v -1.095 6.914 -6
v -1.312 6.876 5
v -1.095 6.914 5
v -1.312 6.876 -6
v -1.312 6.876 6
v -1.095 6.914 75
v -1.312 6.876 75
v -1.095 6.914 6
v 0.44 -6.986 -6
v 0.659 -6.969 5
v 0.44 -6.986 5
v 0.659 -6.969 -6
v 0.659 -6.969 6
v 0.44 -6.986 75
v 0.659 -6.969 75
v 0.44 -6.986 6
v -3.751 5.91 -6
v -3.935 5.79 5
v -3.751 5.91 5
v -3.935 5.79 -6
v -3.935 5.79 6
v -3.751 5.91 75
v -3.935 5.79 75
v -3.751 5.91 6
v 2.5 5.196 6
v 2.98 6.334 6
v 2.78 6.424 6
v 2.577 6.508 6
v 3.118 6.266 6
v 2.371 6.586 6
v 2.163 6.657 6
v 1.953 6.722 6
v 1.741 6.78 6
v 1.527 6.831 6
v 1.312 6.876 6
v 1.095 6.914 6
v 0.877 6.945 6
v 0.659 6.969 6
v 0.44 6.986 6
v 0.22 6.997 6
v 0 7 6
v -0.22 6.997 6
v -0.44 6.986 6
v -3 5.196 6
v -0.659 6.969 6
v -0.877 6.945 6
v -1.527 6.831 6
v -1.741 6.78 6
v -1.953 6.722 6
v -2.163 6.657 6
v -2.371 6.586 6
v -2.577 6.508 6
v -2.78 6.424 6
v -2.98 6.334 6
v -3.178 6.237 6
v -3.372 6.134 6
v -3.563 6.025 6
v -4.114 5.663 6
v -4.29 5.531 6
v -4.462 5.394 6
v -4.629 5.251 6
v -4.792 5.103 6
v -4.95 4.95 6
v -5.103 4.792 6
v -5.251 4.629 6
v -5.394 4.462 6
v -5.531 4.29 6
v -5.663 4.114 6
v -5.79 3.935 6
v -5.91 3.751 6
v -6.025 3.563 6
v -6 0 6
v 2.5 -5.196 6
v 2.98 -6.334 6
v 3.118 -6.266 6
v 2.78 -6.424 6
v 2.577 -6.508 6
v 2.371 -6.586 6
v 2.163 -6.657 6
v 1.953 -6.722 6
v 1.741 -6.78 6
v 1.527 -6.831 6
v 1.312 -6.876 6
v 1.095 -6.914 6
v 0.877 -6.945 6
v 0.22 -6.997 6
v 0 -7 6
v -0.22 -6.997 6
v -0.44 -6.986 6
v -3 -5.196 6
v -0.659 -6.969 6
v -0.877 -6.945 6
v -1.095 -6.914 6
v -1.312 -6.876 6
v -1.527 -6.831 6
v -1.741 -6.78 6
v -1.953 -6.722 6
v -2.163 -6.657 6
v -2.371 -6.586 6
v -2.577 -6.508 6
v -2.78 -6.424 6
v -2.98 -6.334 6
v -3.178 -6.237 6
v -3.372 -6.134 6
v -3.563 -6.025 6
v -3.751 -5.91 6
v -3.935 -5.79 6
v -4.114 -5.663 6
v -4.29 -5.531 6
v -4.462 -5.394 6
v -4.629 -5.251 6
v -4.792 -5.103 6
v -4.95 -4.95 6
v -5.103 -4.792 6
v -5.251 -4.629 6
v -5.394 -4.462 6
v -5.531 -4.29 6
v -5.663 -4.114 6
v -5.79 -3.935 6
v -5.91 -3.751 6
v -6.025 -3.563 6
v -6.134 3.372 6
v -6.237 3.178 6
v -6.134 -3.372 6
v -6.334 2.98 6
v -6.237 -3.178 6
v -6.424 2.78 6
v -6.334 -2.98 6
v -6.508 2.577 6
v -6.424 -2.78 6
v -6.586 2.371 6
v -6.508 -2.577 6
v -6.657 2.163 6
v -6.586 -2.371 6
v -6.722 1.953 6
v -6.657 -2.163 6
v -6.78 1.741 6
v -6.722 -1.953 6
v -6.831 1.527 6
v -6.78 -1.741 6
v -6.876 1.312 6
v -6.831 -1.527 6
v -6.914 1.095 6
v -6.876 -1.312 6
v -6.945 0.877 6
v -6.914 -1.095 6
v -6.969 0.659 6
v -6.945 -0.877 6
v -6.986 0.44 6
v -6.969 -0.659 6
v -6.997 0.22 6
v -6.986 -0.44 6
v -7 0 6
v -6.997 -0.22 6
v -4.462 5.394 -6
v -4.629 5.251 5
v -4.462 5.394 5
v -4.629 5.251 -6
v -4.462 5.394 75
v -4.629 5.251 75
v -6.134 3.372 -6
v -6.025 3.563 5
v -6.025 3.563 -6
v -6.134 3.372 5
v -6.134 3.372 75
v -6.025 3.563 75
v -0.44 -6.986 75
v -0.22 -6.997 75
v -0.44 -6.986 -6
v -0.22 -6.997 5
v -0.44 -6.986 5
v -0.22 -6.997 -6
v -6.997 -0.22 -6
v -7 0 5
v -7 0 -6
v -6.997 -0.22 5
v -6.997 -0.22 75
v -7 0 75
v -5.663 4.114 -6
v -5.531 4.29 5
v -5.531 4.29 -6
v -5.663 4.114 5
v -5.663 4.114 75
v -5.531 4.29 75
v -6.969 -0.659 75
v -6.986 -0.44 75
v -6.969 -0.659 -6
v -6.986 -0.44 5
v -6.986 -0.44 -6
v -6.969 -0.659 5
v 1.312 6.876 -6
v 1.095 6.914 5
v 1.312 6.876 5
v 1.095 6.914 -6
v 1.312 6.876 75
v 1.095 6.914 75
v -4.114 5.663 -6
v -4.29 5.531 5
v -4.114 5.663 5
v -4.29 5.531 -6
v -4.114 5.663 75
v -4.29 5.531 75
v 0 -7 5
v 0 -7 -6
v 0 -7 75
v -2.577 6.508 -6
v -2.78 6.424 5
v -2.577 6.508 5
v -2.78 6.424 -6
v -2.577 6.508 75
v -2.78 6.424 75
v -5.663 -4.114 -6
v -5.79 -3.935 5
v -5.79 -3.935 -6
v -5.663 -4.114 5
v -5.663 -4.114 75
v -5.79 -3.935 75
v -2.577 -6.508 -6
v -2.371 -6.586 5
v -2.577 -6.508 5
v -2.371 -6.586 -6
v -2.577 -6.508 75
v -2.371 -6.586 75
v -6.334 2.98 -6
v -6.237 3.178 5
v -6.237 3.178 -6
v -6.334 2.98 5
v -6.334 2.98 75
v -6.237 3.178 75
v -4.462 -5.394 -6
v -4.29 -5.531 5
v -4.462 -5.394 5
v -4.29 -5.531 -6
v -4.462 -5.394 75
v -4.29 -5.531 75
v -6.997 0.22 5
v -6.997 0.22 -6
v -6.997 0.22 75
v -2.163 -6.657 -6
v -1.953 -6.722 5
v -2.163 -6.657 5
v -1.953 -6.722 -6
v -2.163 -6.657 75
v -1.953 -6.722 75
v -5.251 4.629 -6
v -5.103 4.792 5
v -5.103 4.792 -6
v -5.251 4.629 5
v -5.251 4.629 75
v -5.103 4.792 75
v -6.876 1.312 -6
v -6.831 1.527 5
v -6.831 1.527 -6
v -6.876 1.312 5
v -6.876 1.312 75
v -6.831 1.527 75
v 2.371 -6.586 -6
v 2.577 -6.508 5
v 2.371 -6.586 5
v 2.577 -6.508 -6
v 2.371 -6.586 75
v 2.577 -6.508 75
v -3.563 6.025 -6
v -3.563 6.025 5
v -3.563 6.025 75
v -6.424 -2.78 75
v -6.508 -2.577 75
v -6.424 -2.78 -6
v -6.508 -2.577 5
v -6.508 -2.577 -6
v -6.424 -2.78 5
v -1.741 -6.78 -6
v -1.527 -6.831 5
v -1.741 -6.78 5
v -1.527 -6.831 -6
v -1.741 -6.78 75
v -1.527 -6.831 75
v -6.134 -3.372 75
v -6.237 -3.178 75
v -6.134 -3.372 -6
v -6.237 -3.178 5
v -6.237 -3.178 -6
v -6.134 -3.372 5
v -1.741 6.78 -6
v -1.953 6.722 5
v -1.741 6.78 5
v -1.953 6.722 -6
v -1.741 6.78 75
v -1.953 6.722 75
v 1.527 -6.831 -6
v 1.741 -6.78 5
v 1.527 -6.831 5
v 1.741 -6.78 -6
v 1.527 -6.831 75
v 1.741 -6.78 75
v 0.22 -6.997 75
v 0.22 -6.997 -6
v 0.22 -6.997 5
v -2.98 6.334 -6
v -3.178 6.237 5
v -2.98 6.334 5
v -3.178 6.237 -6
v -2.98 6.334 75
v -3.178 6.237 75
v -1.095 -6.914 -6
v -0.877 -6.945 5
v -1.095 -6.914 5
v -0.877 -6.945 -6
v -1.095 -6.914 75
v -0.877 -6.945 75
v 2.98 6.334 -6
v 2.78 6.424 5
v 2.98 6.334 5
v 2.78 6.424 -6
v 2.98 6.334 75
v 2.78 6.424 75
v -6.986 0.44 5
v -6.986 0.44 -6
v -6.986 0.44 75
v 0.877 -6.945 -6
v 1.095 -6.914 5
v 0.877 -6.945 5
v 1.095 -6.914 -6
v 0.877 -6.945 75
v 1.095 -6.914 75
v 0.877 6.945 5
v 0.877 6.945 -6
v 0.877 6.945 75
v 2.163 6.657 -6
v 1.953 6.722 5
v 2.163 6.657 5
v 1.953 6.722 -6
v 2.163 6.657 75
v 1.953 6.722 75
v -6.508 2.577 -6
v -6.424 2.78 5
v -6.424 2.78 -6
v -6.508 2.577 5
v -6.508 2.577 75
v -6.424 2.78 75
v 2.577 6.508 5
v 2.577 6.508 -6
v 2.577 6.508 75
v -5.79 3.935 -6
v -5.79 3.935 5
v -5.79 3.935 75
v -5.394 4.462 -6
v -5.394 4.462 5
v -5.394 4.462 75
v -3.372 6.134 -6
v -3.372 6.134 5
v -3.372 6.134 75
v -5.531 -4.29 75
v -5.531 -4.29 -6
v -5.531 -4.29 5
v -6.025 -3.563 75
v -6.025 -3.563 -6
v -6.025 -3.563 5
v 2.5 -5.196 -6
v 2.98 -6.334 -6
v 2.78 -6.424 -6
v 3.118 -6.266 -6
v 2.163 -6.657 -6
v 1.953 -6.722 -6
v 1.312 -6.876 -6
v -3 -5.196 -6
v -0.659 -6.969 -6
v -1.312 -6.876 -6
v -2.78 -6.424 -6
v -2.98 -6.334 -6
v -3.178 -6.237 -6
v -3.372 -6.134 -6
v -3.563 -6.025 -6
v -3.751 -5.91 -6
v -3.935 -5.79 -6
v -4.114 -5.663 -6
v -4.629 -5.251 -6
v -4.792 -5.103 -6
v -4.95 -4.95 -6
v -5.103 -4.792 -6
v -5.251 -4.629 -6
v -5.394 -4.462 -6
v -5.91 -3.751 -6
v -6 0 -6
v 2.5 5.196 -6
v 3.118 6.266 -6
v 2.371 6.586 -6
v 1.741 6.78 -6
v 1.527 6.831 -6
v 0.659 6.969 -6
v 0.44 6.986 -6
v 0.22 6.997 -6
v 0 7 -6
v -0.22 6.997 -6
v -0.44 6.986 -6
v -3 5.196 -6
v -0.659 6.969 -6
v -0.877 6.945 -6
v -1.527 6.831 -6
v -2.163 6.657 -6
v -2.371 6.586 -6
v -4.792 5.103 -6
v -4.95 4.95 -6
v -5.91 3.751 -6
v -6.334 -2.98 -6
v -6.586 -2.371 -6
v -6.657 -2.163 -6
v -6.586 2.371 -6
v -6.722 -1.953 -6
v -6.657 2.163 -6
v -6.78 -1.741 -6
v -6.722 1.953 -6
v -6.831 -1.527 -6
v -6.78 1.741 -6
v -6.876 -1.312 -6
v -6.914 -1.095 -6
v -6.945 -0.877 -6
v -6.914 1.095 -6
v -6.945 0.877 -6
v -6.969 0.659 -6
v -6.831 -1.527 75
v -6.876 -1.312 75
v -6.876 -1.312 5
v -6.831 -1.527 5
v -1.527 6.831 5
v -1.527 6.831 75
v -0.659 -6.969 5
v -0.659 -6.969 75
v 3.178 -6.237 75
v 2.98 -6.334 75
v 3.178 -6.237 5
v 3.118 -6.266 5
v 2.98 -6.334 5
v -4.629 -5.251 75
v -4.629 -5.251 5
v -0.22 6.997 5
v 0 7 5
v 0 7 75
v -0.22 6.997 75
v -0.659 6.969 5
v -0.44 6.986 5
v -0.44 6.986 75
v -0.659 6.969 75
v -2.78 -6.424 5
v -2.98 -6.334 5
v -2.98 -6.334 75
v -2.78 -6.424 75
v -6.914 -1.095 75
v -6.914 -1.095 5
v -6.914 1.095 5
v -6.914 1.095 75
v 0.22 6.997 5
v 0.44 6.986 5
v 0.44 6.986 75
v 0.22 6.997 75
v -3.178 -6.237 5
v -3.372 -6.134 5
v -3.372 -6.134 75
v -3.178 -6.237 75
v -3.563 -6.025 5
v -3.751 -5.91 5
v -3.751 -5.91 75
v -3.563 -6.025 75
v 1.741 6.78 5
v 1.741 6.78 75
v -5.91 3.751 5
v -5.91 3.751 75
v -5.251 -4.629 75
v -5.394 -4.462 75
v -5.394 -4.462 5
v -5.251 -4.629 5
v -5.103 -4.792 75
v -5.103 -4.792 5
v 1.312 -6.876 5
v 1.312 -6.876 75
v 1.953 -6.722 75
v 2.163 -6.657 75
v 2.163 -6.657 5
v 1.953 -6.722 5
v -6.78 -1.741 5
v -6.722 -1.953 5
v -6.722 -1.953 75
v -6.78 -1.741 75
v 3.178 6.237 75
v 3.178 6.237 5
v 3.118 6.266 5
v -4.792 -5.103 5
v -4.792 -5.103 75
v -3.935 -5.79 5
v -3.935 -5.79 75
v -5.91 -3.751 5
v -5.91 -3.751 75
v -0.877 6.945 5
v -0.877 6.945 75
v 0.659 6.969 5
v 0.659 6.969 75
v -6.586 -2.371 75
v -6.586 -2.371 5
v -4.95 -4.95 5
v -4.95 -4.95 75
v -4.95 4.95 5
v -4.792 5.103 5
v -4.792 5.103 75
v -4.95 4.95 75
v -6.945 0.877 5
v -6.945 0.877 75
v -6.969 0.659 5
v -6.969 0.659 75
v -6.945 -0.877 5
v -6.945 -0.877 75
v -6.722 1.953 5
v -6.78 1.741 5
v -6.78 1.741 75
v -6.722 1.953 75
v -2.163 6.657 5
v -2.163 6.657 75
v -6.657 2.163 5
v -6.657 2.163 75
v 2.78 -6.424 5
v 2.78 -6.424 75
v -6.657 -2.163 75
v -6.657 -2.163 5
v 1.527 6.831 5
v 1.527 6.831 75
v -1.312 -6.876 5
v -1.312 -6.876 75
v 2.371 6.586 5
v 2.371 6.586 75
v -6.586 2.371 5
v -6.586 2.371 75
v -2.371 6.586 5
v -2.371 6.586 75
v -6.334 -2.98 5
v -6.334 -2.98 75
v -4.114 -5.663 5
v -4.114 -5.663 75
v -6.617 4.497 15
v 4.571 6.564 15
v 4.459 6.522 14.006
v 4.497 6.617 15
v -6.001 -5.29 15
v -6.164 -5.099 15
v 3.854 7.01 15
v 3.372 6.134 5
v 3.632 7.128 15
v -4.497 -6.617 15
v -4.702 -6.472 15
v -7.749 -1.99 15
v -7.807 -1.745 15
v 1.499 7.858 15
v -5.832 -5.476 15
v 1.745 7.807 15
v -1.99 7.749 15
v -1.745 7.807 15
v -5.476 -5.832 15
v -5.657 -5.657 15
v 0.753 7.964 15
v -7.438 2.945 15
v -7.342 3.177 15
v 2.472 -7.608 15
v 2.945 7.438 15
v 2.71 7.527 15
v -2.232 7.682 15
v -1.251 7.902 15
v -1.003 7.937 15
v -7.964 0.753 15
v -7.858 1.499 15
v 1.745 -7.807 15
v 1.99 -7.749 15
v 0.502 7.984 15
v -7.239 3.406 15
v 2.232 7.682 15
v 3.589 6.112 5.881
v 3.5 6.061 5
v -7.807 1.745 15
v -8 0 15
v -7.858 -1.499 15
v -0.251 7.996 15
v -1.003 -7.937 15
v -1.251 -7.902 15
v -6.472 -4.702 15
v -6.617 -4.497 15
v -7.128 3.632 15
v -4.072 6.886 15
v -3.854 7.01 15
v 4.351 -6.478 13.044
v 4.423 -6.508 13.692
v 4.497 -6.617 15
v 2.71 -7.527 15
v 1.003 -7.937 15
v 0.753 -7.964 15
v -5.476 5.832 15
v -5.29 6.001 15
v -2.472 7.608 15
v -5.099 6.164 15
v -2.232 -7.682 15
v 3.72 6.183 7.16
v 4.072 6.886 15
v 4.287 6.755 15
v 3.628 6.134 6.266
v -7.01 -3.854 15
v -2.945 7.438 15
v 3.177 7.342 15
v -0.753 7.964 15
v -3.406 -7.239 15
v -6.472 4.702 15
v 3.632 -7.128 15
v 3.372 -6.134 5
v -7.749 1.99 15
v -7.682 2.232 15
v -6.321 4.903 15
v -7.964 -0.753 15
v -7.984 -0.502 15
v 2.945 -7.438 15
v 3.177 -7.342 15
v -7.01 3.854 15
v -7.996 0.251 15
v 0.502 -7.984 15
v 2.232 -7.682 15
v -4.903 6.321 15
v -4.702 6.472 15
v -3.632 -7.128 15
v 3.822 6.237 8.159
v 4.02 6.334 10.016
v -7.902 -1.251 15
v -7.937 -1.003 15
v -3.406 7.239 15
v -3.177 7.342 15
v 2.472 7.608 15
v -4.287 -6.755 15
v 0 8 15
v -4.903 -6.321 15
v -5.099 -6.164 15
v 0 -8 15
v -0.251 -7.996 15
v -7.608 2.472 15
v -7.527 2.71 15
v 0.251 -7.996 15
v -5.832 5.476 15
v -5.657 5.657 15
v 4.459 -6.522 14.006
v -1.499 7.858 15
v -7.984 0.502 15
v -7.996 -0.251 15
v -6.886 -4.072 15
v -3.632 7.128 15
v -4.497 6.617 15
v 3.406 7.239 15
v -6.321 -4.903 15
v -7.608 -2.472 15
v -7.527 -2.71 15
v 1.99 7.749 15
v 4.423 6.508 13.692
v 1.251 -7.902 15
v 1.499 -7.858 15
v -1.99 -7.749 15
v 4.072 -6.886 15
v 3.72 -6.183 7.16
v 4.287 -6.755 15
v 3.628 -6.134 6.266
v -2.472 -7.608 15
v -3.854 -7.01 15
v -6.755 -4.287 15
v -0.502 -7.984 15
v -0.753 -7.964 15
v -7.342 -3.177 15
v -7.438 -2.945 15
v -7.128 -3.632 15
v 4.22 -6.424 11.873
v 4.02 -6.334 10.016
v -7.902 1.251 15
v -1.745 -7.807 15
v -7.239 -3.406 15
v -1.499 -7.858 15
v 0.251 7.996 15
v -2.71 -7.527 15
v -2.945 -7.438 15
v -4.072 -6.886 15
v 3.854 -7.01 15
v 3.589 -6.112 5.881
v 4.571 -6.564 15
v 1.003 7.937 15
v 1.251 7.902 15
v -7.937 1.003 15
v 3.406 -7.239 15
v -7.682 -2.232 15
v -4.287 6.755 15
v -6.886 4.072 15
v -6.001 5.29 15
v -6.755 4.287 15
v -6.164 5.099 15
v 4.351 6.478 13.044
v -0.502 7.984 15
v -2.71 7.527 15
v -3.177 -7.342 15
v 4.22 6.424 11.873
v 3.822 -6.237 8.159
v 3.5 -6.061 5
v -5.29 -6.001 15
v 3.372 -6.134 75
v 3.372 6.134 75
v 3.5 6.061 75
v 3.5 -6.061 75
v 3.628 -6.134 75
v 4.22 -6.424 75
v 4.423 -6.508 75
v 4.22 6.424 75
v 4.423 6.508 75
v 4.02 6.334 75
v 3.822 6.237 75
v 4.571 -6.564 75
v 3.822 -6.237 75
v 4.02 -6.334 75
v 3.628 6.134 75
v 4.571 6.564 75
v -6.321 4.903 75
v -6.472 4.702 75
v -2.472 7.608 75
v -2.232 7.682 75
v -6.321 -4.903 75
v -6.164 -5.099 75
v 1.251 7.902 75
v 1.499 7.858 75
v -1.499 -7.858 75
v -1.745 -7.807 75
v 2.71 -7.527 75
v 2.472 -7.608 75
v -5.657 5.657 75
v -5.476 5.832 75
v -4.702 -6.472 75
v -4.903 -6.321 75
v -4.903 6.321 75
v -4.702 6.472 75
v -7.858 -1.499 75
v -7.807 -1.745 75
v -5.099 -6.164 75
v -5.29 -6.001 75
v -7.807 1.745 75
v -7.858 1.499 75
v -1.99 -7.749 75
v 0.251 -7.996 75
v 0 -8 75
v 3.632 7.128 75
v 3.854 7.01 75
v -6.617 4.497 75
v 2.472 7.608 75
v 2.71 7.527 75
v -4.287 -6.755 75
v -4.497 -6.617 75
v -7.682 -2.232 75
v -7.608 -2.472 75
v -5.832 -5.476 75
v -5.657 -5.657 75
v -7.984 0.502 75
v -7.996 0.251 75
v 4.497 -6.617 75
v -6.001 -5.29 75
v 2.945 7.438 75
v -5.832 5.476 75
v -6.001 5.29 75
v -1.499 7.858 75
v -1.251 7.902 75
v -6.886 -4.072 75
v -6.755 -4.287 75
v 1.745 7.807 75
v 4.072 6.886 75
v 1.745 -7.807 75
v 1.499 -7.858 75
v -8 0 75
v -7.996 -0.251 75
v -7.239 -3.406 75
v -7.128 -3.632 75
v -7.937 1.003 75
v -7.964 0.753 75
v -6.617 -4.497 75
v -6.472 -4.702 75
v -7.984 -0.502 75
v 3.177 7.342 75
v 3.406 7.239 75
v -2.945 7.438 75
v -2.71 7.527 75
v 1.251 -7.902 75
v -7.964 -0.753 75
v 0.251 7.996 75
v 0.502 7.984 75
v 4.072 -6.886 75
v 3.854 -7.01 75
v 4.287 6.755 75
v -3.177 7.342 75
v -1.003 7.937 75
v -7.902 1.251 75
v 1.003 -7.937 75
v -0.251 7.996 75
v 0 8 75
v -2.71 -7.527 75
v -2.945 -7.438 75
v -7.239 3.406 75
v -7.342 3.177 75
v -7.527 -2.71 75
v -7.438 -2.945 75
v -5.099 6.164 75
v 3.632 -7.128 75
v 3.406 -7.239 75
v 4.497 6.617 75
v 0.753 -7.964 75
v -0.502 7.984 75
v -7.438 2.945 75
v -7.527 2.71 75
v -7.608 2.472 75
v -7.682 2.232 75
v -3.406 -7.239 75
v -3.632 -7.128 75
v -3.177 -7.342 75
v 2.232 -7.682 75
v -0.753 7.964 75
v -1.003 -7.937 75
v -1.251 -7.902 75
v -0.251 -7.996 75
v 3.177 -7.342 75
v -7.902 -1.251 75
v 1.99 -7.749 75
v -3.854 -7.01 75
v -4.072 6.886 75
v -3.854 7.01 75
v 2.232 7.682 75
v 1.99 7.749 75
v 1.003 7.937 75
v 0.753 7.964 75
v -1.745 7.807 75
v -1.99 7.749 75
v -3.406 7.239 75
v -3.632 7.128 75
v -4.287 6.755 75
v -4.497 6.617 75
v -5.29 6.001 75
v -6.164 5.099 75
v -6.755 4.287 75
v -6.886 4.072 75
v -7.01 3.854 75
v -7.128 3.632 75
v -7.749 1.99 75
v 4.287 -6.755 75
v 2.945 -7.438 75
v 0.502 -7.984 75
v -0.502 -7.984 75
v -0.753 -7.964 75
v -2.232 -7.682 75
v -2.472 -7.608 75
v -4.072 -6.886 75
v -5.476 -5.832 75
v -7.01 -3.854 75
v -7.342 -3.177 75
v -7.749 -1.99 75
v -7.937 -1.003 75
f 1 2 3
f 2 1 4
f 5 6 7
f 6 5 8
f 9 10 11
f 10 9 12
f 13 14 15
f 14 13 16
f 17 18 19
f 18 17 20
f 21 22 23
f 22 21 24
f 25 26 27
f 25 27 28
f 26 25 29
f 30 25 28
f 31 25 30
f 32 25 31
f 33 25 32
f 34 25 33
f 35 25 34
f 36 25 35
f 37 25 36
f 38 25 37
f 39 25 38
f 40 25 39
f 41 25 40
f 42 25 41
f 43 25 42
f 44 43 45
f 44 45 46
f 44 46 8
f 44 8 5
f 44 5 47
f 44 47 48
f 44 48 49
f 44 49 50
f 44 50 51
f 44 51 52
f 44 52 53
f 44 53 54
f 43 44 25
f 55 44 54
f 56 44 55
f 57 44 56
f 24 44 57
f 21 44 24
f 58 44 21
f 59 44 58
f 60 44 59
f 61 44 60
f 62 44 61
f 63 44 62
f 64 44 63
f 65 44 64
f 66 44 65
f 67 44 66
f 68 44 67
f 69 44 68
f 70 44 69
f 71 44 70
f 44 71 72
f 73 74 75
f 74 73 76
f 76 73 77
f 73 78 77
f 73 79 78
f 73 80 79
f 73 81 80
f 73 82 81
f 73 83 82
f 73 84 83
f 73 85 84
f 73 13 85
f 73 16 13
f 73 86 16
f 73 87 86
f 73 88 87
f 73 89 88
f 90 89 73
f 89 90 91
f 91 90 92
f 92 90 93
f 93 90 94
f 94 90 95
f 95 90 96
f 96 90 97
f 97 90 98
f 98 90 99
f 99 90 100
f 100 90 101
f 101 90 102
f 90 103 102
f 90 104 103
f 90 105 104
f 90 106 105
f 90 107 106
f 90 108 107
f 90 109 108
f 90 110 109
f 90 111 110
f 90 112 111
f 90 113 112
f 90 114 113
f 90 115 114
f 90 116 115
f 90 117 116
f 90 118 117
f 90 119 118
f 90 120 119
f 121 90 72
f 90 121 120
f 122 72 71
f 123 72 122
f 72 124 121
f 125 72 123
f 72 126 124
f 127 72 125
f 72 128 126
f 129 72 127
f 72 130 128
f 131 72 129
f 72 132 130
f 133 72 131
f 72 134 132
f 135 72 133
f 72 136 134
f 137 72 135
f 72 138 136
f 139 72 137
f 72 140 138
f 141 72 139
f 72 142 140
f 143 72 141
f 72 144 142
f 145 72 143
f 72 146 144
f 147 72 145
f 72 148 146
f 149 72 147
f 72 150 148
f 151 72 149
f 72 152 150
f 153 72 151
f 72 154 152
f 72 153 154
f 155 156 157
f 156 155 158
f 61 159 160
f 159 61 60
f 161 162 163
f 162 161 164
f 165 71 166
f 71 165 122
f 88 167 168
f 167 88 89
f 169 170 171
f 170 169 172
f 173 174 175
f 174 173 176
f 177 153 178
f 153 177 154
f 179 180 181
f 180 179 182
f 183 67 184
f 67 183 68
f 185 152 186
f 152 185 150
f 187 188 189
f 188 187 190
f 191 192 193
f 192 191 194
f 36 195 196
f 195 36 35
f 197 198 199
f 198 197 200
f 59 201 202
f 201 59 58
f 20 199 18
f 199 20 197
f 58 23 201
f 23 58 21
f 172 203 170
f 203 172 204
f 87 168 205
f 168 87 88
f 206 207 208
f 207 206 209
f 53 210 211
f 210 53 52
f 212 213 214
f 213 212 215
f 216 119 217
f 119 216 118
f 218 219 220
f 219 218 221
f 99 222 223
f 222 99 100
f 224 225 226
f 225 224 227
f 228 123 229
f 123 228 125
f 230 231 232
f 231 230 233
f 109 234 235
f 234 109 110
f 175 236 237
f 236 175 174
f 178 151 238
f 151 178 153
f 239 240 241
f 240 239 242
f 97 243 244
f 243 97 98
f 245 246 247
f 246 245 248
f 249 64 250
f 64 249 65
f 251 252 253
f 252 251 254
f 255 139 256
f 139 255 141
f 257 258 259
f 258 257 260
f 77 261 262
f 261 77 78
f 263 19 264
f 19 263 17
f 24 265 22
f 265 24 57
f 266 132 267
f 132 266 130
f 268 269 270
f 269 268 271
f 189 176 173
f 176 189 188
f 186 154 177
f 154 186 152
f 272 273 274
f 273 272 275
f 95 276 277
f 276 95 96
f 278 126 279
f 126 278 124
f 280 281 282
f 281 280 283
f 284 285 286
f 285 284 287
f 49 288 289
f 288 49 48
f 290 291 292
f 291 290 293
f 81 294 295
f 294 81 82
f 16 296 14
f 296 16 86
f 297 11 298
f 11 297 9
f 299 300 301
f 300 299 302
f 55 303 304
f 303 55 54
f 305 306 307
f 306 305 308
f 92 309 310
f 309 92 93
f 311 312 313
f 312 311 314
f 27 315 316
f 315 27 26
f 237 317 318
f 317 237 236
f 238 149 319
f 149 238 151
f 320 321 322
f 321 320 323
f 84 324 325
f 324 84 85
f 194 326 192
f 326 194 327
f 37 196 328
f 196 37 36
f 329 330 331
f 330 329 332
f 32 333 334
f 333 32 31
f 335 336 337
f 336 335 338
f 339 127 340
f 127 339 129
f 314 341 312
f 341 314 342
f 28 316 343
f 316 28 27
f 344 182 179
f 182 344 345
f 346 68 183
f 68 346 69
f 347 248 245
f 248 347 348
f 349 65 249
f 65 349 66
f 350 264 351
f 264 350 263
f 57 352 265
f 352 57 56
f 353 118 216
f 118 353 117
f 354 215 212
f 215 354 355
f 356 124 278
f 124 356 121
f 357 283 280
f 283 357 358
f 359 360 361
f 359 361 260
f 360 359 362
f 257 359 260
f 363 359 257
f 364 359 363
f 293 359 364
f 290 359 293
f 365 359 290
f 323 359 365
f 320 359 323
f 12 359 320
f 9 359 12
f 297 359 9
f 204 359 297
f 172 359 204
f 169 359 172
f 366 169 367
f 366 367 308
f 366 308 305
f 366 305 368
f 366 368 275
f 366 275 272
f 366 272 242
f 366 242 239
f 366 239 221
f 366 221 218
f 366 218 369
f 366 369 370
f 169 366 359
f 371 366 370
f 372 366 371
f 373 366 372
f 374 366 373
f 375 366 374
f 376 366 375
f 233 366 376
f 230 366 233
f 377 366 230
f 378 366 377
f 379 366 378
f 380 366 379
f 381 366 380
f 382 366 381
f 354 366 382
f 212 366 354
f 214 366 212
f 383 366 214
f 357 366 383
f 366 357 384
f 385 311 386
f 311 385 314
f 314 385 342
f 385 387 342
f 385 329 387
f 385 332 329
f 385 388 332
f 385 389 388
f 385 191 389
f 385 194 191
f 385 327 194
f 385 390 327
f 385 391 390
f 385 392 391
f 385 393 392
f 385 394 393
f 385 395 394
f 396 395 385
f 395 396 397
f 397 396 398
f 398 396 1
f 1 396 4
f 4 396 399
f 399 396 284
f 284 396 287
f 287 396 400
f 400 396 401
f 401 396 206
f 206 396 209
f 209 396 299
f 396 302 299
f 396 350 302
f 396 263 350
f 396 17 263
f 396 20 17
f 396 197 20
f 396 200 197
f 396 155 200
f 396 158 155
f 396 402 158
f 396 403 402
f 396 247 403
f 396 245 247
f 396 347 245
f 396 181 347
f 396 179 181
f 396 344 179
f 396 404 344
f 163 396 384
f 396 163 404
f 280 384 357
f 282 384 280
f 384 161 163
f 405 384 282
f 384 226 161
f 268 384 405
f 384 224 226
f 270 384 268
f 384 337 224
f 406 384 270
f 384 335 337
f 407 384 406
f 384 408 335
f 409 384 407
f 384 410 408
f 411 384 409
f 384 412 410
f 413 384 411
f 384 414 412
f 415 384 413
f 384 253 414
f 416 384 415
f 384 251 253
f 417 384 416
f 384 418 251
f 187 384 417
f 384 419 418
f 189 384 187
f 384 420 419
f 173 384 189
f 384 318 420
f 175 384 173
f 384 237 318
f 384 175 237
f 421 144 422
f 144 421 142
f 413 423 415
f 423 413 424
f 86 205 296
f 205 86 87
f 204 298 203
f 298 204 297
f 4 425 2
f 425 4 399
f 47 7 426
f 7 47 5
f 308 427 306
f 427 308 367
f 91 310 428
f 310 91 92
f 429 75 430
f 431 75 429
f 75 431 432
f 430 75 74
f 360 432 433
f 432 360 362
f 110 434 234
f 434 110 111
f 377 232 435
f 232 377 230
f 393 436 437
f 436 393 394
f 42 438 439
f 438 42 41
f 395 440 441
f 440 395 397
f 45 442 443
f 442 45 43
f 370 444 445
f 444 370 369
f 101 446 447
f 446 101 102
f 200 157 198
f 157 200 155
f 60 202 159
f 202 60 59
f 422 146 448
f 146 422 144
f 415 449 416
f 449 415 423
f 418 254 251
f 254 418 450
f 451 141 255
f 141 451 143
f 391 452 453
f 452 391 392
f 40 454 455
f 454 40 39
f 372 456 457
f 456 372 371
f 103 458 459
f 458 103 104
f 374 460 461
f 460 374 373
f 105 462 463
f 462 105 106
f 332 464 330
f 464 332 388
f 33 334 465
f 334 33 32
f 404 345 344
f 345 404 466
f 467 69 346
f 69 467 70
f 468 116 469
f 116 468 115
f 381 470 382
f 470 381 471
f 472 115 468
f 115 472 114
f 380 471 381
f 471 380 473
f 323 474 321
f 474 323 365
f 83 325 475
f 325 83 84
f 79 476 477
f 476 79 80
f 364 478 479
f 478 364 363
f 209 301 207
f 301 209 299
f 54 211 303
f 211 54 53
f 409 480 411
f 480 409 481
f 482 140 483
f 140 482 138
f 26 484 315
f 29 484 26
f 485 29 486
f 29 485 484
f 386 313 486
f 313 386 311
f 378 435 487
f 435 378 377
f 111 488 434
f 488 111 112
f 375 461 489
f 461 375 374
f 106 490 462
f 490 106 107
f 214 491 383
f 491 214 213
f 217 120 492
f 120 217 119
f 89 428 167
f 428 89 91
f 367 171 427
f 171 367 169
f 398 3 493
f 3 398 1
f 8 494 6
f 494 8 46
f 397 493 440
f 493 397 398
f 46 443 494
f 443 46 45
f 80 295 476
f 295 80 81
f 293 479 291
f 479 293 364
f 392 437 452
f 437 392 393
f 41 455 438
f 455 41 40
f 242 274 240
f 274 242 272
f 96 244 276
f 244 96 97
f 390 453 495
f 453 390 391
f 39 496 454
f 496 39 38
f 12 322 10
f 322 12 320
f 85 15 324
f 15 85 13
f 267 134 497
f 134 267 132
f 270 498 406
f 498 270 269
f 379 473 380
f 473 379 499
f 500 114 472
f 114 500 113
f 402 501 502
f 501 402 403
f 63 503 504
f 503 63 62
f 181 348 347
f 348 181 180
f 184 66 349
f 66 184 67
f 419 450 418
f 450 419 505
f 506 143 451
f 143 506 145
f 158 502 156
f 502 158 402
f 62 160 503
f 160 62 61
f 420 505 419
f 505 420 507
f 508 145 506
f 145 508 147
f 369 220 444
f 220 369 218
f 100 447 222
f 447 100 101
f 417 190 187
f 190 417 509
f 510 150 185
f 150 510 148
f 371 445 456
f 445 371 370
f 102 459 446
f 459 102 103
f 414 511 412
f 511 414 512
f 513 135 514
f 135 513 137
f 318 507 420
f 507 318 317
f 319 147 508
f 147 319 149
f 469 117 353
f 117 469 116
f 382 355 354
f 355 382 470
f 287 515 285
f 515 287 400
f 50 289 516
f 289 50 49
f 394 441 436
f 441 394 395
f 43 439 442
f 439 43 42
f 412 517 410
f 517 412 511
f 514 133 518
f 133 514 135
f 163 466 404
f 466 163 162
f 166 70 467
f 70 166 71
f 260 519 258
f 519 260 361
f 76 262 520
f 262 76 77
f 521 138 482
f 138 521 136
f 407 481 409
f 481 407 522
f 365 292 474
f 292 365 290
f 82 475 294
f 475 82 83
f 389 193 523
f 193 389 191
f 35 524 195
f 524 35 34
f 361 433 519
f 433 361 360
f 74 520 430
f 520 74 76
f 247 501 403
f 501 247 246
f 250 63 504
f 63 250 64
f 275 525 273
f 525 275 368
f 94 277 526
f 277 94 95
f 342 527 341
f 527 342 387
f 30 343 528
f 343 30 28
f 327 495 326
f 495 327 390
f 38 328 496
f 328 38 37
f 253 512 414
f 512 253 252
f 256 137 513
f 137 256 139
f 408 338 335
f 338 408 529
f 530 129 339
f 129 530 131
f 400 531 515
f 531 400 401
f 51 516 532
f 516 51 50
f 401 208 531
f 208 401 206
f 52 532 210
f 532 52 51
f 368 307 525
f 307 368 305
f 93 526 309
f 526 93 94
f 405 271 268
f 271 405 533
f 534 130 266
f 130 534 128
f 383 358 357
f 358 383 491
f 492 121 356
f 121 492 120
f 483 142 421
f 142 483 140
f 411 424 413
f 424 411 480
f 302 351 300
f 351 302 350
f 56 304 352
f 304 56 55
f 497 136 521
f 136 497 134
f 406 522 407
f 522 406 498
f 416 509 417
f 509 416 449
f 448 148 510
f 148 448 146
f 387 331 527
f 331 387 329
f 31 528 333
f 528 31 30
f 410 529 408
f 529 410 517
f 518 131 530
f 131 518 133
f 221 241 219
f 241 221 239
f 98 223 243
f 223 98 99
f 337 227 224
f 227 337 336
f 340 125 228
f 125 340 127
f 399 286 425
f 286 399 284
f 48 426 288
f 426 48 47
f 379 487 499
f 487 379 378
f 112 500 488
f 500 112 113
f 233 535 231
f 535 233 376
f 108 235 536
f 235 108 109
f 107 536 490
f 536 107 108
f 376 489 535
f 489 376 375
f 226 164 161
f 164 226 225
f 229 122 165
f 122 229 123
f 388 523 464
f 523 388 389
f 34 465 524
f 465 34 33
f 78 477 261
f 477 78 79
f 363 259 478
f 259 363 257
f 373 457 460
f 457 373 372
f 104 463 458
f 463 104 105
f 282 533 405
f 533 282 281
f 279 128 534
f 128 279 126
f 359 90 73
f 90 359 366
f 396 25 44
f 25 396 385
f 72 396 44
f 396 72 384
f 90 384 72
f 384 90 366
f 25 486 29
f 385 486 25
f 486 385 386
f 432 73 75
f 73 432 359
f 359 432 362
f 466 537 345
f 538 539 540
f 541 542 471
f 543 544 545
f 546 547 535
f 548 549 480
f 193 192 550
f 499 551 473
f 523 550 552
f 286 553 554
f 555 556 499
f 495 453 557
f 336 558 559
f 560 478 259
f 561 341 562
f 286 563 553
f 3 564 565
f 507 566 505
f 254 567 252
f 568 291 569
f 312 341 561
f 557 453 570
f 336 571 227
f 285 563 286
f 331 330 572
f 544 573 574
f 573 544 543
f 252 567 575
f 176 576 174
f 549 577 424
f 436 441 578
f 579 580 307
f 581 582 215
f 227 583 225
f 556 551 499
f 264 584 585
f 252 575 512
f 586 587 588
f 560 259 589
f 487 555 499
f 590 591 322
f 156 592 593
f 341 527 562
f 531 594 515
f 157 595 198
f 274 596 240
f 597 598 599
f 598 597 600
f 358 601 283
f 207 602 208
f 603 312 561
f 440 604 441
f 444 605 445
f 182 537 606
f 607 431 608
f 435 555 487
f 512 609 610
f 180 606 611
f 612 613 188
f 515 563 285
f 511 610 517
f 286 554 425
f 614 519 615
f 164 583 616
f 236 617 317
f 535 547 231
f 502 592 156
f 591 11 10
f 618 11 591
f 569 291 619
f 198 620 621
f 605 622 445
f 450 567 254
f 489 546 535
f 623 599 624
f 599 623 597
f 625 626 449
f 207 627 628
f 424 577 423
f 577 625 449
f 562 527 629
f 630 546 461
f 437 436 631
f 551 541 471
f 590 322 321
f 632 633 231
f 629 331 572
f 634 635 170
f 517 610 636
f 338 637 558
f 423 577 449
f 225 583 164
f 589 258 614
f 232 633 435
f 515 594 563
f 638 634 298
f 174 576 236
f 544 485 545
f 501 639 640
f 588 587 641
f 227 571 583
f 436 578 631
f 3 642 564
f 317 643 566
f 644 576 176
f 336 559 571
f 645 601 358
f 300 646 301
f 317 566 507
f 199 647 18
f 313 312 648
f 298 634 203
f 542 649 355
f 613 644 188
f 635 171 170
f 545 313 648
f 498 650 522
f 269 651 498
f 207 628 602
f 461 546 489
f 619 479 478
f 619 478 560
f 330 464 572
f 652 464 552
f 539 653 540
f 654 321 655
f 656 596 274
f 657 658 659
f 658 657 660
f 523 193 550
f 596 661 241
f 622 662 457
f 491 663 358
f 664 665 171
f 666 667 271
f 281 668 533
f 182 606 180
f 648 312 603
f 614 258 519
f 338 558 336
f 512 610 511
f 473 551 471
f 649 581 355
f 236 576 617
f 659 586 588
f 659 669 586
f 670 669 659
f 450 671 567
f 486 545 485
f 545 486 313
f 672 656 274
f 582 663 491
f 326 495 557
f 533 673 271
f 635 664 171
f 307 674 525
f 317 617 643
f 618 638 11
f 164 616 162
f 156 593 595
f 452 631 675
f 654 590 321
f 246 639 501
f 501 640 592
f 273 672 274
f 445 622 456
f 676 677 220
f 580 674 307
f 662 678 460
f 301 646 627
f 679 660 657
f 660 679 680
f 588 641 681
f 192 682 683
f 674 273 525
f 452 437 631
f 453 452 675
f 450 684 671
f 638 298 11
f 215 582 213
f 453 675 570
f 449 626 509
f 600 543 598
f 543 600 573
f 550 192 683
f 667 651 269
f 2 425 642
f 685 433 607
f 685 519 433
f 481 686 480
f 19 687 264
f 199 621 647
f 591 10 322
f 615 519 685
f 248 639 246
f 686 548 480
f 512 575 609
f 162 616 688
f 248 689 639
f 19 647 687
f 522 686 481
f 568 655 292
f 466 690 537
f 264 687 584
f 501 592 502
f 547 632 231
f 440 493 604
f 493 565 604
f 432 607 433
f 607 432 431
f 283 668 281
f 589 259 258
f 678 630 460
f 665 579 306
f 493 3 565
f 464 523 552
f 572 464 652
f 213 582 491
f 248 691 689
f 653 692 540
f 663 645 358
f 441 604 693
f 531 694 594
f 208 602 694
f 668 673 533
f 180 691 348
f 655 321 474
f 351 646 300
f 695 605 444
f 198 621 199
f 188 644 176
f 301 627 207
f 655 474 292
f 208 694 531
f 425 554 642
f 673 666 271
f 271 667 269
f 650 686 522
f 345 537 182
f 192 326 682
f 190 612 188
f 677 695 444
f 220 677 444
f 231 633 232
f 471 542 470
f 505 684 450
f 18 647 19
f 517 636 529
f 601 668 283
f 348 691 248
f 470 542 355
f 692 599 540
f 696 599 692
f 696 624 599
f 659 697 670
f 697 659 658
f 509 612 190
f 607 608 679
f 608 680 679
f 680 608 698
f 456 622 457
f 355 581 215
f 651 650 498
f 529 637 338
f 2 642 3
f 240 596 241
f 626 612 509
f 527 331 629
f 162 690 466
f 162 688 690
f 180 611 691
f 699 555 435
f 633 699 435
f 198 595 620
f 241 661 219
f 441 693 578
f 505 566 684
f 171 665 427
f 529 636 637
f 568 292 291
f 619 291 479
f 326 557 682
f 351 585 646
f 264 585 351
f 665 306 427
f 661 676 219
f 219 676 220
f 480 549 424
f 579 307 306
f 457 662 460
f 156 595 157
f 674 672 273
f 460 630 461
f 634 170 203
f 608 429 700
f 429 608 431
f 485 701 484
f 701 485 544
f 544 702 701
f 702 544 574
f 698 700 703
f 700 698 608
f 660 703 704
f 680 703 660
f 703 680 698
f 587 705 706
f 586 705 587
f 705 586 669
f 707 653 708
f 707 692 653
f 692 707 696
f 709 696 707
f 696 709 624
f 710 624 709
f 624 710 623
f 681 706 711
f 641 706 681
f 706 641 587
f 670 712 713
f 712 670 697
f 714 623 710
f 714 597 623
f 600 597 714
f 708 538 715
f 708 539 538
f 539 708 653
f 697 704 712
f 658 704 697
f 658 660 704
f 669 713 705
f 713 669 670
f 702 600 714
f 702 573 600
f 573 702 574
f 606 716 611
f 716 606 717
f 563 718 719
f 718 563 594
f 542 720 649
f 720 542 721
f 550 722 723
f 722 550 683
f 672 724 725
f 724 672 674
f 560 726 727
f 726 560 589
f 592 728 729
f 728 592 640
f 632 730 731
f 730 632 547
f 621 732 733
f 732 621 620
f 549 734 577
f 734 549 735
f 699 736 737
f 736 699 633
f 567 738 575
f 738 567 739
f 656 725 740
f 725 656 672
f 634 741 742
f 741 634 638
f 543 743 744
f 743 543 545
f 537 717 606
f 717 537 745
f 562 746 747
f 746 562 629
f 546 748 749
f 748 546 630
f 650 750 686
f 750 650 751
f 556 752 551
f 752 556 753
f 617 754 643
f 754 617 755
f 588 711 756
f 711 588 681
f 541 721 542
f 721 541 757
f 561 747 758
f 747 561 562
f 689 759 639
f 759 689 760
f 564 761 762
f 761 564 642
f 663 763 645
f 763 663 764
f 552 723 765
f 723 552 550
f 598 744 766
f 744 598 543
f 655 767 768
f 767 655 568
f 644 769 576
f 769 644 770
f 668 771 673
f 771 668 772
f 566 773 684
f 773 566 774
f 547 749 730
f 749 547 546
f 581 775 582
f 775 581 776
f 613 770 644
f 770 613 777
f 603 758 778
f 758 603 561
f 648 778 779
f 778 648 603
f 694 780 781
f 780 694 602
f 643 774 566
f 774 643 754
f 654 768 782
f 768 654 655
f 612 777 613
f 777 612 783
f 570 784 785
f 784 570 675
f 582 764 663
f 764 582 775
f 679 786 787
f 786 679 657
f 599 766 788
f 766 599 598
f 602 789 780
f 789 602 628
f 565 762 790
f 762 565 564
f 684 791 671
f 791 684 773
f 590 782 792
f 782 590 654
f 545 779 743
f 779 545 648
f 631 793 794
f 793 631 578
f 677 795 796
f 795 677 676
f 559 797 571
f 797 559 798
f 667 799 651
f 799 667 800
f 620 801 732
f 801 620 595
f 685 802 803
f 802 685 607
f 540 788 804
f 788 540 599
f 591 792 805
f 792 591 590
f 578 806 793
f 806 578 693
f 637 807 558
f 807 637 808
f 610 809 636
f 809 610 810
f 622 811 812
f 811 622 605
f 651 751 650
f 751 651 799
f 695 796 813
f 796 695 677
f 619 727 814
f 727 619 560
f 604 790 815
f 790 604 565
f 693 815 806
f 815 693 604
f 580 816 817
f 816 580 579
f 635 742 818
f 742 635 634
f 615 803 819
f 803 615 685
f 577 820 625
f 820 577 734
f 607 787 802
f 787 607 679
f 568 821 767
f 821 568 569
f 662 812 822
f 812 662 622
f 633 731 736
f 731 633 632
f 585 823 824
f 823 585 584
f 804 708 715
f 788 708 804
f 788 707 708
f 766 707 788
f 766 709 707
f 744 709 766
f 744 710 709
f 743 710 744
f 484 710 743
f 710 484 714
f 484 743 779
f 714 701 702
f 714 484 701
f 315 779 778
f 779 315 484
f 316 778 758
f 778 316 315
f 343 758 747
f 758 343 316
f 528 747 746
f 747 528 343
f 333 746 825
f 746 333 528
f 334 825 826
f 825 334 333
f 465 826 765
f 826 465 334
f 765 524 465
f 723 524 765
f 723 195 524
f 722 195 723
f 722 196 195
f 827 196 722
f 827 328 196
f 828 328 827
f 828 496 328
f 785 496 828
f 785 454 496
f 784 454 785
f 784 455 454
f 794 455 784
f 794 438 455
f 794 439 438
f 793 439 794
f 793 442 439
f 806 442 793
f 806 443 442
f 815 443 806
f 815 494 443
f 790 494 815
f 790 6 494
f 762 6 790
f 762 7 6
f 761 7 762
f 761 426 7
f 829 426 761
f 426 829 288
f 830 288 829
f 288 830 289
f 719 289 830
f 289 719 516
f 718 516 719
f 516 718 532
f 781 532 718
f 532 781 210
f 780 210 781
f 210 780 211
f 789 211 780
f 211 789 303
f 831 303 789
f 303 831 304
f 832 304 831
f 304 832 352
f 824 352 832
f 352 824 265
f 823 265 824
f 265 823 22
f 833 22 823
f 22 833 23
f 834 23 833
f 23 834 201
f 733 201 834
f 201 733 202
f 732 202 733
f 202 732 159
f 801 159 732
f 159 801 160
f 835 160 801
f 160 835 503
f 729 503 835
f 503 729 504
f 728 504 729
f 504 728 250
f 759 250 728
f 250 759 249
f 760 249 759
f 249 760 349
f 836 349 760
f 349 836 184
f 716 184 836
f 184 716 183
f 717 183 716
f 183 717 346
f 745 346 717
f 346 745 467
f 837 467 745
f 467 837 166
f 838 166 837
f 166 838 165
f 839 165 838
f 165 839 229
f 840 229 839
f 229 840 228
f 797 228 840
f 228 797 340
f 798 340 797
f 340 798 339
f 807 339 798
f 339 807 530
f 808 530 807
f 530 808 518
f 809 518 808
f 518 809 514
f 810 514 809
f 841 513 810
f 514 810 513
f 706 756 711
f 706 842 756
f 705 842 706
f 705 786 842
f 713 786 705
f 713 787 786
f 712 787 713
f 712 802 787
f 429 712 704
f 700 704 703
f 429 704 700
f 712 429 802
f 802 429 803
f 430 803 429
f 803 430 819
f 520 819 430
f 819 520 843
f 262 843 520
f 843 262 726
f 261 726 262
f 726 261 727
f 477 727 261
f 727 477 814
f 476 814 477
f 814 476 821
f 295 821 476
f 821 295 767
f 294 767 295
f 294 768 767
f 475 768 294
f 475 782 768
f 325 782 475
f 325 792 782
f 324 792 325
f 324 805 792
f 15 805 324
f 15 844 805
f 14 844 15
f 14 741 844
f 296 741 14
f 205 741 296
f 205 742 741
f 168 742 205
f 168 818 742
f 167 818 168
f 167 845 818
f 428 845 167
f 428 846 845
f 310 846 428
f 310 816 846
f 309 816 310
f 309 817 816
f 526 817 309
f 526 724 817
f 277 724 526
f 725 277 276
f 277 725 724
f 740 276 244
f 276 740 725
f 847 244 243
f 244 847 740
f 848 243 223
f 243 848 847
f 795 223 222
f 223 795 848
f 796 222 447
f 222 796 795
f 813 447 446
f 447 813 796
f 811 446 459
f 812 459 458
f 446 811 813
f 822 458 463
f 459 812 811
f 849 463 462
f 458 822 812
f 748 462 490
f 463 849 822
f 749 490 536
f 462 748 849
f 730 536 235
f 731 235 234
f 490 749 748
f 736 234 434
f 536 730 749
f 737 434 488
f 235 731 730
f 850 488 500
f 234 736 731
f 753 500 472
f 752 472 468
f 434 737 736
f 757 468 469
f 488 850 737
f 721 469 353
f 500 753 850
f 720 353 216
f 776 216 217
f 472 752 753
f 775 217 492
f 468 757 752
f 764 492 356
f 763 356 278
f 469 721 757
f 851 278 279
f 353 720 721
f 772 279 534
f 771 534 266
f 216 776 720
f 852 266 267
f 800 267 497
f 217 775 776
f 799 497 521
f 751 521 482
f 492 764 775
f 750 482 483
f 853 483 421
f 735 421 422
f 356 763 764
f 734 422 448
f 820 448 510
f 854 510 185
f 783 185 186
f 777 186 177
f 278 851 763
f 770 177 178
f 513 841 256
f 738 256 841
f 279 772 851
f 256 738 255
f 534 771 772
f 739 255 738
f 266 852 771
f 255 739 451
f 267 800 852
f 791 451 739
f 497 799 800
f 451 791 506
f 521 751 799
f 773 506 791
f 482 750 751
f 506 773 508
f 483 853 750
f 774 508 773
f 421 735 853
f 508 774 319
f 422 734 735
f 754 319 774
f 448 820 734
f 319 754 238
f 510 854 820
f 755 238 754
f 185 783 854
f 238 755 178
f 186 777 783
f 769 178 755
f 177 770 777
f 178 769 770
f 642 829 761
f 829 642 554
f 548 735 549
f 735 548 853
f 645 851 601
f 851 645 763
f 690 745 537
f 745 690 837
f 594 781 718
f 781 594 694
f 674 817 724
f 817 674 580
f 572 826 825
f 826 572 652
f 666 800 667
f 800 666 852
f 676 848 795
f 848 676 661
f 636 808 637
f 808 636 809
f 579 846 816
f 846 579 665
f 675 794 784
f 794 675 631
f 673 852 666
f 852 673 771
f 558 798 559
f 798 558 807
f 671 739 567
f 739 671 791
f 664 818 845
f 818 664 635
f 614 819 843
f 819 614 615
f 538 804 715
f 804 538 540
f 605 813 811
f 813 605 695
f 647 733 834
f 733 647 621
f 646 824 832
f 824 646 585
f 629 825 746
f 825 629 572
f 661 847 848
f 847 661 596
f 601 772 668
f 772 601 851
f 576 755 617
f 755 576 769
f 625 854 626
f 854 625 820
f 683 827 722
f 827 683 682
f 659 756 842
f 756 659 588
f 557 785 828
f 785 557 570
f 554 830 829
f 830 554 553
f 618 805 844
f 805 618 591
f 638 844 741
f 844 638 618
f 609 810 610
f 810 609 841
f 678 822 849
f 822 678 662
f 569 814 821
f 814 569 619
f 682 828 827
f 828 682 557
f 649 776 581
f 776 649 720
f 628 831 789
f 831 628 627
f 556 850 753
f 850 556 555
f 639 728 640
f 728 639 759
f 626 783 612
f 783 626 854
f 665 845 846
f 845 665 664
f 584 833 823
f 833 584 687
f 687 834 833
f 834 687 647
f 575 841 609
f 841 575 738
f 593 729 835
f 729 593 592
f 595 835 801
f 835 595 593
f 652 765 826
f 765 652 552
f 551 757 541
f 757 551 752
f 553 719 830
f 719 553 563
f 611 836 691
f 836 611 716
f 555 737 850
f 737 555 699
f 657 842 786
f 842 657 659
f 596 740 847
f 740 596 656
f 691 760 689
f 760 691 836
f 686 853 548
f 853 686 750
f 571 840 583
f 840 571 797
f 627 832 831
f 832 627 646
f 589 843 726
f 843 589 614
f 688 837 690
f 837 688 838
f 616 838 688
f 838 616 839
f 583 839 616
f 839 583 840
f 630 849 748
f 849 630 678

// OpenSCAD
bowden_wrench();


module bowden_wrench() {
    outside=14;
    inside=12;
    stem_offset = 7;
    mouth_height = 12;
    
    difference() {
        union(){
            // Bottom wrench mouth
            difference(){
                cylinder(h=mouth_height, d=outside, $fn=200, center=true);
                cylinder(h=mouth_height+1, d=inside, $fn=6, center=true);
                translate([7.5, 0, 0]) cylinder(h=mouth_height+1, d=16, $fn=6, center=true);        
            }
            
            difference() {
                translate([0,0,10]) cylinder(h=10, d1=outside, d2=outside+2, $fn=200, center=true);
                translate([0,0,10]) cylinder(h=11, d=outside, $fn=200, center=true);
                translate([stem_offset,0,10]) cylinder(h=11, d=outside, $fn=200, center=true);
            }

            difference() {
                translate([0,0,45]) cylinder(h=60, d=outside+2, $fn=200, center=true);
                translate([0,0,45]) cylinder(h=61, d=outside, $fn=200, center=true);
                translate([stem_offset,0,45]) cylinder(h=61, d=outside, $fn=200, center=true);
            }
         
        }
    }
}
